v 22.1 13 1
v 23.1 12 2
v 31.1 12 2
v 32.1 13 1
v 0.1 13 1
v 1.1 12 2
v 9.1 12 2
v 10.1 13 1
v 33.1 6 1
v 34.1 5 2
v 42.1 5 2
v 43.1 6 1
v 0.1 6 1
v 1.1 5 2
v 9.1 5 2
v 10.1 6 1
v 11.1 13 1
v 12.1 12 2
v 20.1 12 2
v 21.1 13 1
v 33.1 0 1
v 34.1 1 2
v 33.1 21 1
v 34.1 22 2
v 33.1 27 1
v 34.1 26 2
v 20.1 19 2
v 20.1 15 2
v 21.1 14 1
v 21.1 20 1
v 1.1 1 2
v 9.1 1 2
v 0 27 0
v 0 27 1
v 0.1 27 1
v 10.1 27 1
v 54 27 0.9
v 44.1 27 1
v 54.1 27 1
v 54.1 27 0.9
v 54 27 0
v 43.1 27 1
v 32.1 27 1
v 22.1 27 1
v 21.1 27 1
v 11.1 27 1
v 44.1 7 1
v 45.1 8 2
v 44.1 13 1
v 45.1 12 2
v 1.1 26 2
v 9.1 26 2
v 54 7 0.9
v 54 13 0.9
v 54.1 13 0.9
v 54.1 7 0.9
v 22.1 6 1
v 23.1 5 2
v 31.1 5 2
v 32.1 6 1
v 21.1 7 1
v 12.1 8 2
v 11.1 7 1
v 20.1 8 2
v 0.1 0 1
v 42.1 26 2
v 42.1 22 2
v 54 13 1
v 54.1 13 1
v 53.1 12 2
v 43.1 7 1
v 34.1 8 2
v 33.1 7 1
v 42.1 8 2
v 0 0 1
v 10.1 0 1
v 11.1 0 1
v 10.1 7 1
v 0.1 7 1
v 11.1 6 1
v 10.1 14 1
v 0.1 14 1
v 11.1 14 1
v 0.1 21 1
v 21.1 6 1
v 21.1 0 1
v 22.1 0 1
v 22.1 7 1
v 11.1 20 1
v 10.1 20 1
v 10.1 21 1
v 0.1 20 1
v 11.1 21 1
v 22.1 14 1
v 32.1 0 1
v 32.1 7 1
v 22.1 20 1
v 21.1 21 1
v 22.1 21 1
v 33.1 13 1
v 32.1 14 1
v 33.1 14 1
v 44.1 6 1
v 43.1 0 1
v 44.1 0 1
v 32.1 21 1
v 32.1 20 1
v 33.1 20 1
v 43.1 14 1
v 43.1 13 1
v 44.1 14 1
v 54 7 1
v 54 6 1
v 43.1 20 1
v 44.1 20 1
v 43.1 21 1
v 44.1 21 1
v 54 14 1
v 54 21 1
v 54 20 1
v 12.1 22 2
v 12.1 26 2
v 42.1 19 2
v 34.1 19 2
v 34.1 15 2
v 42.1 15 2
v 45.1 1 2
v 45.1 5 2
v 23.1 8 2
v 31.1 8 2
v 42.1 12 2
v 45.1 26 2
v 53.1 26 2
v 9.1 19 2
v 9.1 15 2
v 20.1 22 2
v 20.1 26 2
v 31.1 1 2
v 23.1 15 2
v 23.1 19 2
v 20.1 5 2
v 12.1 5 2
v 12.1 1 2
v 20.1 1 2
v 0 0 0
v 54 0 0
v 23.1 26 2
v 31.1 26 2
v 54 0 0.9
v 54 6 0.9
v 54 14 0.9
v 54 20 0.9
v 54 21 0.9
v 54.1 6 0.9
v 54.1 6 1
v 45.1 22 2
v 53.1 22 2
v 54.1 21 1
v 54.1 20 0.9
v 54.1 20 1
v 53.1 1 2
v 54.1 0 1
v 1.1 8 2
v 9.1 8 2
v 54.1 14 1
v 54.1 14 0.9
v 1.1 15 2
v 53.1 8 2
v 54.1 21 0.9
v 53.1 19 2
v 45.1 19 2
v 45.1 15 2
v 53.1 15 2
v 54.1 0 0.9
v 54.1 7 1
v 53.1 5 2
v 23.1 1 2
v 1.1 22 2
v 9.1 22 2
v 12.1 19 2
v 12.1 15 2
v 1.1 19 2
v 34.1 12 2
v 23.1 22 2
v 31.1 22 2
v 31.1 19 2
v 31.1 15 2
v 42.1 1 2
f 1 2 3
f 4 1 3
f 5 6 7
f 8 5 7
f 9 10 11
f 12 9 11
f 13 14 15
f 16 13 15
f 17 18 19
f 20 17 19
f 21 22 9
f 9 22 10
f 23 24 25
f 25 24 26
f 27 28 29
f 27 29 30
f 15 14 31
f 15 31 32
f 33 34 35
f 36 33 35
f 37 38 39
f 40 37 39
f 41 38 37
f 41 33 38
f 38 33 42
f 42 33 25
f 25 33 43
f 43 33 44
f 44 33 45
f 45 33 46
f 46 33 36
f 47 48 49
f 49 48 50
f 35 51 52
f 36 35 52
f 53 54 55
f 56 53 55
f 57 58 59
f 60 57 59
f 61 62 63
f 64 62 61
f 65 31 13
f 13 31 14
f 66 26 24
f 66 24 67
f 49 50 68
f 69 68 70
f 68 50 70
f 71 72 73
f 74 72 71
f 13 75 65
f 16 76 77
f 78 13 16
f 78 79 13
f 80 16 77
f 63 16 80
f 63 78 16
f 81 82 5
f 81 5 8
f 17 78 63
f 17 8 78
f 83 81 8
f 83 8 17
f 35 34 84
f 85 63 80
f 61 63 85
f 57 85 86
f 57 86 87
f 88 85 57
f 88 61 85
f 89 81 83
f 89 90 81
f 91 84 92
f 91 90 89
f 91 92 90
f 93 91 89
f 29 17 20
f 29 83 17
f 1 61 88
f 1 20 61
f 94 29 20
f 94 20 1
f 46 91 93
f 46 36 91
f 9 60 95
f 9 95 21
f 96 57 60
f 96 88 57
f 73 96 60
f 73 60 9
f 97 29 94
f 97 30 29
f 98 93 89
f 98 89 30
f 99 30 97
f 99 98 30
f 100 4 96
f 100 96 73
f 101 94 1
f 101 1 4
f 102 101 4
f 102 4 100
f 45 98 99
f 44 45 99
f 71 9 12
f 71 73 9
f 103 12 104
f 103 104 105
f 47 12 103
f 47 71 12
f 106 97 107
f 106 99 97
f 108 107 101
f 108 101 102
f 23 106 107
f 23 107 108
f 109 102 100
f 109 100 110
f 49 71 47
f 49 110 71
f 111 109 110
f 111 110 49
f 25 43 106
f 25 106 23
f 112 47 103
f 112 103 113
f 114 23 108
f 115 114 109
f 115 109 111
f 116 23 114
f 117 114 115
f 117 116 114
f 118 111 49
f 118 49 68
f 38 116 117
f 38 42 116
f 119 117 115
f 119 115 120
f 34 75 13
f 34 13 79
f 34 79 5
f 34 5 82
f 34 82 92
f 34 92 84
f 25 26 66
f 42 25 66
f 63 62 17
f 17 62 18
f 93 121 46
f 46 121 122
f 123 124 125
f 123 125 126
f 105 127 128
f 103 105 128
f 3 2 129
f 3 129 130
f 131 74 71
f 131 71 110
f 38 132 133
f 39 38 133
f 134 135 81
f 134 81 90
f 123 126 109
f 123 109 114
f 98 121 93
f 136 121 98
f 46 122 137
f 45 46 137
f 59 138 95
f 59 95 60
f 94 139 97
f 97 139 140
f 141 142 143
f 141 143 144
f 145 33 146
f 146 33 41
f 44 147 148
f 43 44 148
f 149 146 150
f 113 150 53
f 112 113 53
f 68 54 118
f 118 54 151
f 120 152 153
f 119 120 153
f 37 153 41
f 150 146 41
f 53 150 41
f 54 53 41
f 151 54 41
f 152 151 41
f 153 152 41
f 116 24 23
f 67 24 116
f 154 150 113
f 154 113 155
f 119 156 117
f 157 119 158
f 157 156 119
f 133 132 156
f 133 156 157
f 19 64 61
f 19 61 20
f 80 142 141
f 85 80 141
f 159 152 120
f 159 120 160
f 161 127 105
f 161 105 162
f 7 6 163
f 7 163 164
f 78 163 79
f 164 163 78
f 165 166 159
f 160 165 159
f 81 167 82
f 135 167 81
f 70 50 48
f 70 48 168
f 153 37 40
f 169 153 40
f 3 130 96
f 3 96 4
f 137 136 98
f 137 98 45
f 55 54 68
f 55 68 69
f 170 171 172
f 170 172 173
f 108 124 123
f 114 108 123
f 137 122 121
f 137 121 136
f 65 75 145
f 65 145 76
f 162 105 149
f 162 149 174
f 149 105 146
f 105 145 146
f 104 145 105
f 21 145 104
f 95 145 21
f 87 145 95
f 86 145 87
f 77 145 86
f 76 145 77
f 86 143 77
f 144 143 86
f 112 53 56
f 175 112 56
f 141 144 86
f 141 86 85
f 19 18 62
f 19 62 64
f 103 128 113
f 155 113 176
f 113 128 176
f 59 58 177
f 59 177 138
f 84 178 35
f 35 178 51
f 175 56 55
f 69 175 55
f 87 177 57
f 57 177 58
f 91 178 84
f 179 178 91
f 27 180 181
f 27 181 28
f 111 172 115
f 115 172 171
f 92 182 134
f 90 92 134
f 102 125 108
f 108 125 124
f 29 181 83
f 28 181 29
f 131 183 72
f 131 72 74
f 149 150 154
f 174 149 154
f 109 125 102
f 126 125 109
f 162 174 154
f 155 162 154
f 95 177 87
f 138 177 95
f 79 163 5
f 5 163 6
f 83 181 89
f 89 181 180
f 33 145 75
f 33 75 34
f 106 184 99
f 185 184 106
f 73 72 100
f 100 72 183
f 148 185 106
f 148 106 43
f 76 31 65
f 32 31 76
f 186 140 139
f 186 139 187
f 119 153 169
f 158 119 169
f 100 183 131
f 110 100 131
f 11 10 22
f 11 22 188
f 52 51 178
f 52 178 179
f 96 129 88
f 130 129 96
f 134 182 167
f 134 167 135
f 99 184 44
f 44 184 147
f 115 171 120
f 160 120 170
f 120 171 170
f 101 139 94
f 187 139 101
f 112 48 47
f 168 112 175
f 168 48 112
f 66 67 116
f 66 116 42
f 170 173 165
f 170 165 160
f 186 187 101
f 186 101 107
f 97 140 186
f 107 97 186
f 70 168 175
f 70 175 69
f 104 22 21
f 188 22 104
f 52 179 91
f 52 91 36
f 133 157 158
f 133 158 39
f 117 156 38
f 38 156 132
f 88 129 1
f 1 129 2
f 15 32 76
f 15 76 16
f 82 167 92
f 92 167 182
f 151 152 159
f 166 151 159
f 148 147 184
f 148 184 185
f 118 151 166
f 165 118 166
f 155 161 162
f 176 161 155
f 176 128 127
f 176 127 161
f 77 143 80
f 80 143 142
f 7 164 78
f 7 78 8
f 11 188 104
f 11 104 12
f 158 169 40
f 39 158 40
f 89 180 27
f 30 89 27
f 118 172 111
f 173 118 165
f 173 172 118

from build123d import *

# Parameters (mm, degrees)
BOX_W         = 54
BOX_H         = 27
BOX_DEPTH     = 1
BOX001_W      = 10
BOX001_H      = 6
BOX001_DEPTH  = 1.1
CHAMFER_SIZE  = 1
ARRAY_X_COUNT = 5
ARRAY_X_PITCH = 11
ARRAY_Y_COUNT = 4
ARRAY_Y_PITCH = 7


with BuildPart() as cub:
    # Box → Box (new body)
    with BuildSketch(Plane.XY):
        with Locations((27, 13.5)):
            Rectangle(BOX_W, BOX_H)
    extrude(amount=BOX_DEPTH)


with BuildPart() as fusion:
    # Box001 → Box001 (new body)
    with BuildSketch(Plane(origin=(-13, 0, 0), x_dir=(1, 0, 0), z_dir=(0, 0, 1))):
        with Locations((5, 3)):
            Rectangle(BOX001_W, BOX001_H)
    extrude(amount=BOX001_DEPTH)

    # Chamfer
    chamfer_edges = [fusion.edges().sort_by_distance(p)[0] for p in [
        (-13, 3, 1.1),
        (-3, 3, 1.1),
        (-8, 0, 1.1),
        (-8, 6, 1.1),
    ]]
    chamfer(chamfer_edges, length=CHAMFER_SIZE)


with BuildPart() as fusion_1:
    # Chamfer placement: moved
    add(fusion.part.moved(Location((13.1, 0, 0.9))))

    # Array X: Fusion ×5


with BuildPart() as fusion_2:
    add(fusion_1.part)
    with Locations(*[(i * ARRAY_X_PITCH, 0, 0) for i in range(1, ARRAY_X_COUNT)]):
        add(fusion_1.part)

    # Array Y: Fusion ×4


with BuildPart() as fusion_3:
    add(fusion_2.part)
    with Locations(*[(0, i * ARRAY_Y_PITCH, 0) for i in range(1, ARRAY_Y_COUNT)]):
        add(fusion_2.part)

    # Fusion: union Cub
    add(cub.part)


solid = fusion_3.part
